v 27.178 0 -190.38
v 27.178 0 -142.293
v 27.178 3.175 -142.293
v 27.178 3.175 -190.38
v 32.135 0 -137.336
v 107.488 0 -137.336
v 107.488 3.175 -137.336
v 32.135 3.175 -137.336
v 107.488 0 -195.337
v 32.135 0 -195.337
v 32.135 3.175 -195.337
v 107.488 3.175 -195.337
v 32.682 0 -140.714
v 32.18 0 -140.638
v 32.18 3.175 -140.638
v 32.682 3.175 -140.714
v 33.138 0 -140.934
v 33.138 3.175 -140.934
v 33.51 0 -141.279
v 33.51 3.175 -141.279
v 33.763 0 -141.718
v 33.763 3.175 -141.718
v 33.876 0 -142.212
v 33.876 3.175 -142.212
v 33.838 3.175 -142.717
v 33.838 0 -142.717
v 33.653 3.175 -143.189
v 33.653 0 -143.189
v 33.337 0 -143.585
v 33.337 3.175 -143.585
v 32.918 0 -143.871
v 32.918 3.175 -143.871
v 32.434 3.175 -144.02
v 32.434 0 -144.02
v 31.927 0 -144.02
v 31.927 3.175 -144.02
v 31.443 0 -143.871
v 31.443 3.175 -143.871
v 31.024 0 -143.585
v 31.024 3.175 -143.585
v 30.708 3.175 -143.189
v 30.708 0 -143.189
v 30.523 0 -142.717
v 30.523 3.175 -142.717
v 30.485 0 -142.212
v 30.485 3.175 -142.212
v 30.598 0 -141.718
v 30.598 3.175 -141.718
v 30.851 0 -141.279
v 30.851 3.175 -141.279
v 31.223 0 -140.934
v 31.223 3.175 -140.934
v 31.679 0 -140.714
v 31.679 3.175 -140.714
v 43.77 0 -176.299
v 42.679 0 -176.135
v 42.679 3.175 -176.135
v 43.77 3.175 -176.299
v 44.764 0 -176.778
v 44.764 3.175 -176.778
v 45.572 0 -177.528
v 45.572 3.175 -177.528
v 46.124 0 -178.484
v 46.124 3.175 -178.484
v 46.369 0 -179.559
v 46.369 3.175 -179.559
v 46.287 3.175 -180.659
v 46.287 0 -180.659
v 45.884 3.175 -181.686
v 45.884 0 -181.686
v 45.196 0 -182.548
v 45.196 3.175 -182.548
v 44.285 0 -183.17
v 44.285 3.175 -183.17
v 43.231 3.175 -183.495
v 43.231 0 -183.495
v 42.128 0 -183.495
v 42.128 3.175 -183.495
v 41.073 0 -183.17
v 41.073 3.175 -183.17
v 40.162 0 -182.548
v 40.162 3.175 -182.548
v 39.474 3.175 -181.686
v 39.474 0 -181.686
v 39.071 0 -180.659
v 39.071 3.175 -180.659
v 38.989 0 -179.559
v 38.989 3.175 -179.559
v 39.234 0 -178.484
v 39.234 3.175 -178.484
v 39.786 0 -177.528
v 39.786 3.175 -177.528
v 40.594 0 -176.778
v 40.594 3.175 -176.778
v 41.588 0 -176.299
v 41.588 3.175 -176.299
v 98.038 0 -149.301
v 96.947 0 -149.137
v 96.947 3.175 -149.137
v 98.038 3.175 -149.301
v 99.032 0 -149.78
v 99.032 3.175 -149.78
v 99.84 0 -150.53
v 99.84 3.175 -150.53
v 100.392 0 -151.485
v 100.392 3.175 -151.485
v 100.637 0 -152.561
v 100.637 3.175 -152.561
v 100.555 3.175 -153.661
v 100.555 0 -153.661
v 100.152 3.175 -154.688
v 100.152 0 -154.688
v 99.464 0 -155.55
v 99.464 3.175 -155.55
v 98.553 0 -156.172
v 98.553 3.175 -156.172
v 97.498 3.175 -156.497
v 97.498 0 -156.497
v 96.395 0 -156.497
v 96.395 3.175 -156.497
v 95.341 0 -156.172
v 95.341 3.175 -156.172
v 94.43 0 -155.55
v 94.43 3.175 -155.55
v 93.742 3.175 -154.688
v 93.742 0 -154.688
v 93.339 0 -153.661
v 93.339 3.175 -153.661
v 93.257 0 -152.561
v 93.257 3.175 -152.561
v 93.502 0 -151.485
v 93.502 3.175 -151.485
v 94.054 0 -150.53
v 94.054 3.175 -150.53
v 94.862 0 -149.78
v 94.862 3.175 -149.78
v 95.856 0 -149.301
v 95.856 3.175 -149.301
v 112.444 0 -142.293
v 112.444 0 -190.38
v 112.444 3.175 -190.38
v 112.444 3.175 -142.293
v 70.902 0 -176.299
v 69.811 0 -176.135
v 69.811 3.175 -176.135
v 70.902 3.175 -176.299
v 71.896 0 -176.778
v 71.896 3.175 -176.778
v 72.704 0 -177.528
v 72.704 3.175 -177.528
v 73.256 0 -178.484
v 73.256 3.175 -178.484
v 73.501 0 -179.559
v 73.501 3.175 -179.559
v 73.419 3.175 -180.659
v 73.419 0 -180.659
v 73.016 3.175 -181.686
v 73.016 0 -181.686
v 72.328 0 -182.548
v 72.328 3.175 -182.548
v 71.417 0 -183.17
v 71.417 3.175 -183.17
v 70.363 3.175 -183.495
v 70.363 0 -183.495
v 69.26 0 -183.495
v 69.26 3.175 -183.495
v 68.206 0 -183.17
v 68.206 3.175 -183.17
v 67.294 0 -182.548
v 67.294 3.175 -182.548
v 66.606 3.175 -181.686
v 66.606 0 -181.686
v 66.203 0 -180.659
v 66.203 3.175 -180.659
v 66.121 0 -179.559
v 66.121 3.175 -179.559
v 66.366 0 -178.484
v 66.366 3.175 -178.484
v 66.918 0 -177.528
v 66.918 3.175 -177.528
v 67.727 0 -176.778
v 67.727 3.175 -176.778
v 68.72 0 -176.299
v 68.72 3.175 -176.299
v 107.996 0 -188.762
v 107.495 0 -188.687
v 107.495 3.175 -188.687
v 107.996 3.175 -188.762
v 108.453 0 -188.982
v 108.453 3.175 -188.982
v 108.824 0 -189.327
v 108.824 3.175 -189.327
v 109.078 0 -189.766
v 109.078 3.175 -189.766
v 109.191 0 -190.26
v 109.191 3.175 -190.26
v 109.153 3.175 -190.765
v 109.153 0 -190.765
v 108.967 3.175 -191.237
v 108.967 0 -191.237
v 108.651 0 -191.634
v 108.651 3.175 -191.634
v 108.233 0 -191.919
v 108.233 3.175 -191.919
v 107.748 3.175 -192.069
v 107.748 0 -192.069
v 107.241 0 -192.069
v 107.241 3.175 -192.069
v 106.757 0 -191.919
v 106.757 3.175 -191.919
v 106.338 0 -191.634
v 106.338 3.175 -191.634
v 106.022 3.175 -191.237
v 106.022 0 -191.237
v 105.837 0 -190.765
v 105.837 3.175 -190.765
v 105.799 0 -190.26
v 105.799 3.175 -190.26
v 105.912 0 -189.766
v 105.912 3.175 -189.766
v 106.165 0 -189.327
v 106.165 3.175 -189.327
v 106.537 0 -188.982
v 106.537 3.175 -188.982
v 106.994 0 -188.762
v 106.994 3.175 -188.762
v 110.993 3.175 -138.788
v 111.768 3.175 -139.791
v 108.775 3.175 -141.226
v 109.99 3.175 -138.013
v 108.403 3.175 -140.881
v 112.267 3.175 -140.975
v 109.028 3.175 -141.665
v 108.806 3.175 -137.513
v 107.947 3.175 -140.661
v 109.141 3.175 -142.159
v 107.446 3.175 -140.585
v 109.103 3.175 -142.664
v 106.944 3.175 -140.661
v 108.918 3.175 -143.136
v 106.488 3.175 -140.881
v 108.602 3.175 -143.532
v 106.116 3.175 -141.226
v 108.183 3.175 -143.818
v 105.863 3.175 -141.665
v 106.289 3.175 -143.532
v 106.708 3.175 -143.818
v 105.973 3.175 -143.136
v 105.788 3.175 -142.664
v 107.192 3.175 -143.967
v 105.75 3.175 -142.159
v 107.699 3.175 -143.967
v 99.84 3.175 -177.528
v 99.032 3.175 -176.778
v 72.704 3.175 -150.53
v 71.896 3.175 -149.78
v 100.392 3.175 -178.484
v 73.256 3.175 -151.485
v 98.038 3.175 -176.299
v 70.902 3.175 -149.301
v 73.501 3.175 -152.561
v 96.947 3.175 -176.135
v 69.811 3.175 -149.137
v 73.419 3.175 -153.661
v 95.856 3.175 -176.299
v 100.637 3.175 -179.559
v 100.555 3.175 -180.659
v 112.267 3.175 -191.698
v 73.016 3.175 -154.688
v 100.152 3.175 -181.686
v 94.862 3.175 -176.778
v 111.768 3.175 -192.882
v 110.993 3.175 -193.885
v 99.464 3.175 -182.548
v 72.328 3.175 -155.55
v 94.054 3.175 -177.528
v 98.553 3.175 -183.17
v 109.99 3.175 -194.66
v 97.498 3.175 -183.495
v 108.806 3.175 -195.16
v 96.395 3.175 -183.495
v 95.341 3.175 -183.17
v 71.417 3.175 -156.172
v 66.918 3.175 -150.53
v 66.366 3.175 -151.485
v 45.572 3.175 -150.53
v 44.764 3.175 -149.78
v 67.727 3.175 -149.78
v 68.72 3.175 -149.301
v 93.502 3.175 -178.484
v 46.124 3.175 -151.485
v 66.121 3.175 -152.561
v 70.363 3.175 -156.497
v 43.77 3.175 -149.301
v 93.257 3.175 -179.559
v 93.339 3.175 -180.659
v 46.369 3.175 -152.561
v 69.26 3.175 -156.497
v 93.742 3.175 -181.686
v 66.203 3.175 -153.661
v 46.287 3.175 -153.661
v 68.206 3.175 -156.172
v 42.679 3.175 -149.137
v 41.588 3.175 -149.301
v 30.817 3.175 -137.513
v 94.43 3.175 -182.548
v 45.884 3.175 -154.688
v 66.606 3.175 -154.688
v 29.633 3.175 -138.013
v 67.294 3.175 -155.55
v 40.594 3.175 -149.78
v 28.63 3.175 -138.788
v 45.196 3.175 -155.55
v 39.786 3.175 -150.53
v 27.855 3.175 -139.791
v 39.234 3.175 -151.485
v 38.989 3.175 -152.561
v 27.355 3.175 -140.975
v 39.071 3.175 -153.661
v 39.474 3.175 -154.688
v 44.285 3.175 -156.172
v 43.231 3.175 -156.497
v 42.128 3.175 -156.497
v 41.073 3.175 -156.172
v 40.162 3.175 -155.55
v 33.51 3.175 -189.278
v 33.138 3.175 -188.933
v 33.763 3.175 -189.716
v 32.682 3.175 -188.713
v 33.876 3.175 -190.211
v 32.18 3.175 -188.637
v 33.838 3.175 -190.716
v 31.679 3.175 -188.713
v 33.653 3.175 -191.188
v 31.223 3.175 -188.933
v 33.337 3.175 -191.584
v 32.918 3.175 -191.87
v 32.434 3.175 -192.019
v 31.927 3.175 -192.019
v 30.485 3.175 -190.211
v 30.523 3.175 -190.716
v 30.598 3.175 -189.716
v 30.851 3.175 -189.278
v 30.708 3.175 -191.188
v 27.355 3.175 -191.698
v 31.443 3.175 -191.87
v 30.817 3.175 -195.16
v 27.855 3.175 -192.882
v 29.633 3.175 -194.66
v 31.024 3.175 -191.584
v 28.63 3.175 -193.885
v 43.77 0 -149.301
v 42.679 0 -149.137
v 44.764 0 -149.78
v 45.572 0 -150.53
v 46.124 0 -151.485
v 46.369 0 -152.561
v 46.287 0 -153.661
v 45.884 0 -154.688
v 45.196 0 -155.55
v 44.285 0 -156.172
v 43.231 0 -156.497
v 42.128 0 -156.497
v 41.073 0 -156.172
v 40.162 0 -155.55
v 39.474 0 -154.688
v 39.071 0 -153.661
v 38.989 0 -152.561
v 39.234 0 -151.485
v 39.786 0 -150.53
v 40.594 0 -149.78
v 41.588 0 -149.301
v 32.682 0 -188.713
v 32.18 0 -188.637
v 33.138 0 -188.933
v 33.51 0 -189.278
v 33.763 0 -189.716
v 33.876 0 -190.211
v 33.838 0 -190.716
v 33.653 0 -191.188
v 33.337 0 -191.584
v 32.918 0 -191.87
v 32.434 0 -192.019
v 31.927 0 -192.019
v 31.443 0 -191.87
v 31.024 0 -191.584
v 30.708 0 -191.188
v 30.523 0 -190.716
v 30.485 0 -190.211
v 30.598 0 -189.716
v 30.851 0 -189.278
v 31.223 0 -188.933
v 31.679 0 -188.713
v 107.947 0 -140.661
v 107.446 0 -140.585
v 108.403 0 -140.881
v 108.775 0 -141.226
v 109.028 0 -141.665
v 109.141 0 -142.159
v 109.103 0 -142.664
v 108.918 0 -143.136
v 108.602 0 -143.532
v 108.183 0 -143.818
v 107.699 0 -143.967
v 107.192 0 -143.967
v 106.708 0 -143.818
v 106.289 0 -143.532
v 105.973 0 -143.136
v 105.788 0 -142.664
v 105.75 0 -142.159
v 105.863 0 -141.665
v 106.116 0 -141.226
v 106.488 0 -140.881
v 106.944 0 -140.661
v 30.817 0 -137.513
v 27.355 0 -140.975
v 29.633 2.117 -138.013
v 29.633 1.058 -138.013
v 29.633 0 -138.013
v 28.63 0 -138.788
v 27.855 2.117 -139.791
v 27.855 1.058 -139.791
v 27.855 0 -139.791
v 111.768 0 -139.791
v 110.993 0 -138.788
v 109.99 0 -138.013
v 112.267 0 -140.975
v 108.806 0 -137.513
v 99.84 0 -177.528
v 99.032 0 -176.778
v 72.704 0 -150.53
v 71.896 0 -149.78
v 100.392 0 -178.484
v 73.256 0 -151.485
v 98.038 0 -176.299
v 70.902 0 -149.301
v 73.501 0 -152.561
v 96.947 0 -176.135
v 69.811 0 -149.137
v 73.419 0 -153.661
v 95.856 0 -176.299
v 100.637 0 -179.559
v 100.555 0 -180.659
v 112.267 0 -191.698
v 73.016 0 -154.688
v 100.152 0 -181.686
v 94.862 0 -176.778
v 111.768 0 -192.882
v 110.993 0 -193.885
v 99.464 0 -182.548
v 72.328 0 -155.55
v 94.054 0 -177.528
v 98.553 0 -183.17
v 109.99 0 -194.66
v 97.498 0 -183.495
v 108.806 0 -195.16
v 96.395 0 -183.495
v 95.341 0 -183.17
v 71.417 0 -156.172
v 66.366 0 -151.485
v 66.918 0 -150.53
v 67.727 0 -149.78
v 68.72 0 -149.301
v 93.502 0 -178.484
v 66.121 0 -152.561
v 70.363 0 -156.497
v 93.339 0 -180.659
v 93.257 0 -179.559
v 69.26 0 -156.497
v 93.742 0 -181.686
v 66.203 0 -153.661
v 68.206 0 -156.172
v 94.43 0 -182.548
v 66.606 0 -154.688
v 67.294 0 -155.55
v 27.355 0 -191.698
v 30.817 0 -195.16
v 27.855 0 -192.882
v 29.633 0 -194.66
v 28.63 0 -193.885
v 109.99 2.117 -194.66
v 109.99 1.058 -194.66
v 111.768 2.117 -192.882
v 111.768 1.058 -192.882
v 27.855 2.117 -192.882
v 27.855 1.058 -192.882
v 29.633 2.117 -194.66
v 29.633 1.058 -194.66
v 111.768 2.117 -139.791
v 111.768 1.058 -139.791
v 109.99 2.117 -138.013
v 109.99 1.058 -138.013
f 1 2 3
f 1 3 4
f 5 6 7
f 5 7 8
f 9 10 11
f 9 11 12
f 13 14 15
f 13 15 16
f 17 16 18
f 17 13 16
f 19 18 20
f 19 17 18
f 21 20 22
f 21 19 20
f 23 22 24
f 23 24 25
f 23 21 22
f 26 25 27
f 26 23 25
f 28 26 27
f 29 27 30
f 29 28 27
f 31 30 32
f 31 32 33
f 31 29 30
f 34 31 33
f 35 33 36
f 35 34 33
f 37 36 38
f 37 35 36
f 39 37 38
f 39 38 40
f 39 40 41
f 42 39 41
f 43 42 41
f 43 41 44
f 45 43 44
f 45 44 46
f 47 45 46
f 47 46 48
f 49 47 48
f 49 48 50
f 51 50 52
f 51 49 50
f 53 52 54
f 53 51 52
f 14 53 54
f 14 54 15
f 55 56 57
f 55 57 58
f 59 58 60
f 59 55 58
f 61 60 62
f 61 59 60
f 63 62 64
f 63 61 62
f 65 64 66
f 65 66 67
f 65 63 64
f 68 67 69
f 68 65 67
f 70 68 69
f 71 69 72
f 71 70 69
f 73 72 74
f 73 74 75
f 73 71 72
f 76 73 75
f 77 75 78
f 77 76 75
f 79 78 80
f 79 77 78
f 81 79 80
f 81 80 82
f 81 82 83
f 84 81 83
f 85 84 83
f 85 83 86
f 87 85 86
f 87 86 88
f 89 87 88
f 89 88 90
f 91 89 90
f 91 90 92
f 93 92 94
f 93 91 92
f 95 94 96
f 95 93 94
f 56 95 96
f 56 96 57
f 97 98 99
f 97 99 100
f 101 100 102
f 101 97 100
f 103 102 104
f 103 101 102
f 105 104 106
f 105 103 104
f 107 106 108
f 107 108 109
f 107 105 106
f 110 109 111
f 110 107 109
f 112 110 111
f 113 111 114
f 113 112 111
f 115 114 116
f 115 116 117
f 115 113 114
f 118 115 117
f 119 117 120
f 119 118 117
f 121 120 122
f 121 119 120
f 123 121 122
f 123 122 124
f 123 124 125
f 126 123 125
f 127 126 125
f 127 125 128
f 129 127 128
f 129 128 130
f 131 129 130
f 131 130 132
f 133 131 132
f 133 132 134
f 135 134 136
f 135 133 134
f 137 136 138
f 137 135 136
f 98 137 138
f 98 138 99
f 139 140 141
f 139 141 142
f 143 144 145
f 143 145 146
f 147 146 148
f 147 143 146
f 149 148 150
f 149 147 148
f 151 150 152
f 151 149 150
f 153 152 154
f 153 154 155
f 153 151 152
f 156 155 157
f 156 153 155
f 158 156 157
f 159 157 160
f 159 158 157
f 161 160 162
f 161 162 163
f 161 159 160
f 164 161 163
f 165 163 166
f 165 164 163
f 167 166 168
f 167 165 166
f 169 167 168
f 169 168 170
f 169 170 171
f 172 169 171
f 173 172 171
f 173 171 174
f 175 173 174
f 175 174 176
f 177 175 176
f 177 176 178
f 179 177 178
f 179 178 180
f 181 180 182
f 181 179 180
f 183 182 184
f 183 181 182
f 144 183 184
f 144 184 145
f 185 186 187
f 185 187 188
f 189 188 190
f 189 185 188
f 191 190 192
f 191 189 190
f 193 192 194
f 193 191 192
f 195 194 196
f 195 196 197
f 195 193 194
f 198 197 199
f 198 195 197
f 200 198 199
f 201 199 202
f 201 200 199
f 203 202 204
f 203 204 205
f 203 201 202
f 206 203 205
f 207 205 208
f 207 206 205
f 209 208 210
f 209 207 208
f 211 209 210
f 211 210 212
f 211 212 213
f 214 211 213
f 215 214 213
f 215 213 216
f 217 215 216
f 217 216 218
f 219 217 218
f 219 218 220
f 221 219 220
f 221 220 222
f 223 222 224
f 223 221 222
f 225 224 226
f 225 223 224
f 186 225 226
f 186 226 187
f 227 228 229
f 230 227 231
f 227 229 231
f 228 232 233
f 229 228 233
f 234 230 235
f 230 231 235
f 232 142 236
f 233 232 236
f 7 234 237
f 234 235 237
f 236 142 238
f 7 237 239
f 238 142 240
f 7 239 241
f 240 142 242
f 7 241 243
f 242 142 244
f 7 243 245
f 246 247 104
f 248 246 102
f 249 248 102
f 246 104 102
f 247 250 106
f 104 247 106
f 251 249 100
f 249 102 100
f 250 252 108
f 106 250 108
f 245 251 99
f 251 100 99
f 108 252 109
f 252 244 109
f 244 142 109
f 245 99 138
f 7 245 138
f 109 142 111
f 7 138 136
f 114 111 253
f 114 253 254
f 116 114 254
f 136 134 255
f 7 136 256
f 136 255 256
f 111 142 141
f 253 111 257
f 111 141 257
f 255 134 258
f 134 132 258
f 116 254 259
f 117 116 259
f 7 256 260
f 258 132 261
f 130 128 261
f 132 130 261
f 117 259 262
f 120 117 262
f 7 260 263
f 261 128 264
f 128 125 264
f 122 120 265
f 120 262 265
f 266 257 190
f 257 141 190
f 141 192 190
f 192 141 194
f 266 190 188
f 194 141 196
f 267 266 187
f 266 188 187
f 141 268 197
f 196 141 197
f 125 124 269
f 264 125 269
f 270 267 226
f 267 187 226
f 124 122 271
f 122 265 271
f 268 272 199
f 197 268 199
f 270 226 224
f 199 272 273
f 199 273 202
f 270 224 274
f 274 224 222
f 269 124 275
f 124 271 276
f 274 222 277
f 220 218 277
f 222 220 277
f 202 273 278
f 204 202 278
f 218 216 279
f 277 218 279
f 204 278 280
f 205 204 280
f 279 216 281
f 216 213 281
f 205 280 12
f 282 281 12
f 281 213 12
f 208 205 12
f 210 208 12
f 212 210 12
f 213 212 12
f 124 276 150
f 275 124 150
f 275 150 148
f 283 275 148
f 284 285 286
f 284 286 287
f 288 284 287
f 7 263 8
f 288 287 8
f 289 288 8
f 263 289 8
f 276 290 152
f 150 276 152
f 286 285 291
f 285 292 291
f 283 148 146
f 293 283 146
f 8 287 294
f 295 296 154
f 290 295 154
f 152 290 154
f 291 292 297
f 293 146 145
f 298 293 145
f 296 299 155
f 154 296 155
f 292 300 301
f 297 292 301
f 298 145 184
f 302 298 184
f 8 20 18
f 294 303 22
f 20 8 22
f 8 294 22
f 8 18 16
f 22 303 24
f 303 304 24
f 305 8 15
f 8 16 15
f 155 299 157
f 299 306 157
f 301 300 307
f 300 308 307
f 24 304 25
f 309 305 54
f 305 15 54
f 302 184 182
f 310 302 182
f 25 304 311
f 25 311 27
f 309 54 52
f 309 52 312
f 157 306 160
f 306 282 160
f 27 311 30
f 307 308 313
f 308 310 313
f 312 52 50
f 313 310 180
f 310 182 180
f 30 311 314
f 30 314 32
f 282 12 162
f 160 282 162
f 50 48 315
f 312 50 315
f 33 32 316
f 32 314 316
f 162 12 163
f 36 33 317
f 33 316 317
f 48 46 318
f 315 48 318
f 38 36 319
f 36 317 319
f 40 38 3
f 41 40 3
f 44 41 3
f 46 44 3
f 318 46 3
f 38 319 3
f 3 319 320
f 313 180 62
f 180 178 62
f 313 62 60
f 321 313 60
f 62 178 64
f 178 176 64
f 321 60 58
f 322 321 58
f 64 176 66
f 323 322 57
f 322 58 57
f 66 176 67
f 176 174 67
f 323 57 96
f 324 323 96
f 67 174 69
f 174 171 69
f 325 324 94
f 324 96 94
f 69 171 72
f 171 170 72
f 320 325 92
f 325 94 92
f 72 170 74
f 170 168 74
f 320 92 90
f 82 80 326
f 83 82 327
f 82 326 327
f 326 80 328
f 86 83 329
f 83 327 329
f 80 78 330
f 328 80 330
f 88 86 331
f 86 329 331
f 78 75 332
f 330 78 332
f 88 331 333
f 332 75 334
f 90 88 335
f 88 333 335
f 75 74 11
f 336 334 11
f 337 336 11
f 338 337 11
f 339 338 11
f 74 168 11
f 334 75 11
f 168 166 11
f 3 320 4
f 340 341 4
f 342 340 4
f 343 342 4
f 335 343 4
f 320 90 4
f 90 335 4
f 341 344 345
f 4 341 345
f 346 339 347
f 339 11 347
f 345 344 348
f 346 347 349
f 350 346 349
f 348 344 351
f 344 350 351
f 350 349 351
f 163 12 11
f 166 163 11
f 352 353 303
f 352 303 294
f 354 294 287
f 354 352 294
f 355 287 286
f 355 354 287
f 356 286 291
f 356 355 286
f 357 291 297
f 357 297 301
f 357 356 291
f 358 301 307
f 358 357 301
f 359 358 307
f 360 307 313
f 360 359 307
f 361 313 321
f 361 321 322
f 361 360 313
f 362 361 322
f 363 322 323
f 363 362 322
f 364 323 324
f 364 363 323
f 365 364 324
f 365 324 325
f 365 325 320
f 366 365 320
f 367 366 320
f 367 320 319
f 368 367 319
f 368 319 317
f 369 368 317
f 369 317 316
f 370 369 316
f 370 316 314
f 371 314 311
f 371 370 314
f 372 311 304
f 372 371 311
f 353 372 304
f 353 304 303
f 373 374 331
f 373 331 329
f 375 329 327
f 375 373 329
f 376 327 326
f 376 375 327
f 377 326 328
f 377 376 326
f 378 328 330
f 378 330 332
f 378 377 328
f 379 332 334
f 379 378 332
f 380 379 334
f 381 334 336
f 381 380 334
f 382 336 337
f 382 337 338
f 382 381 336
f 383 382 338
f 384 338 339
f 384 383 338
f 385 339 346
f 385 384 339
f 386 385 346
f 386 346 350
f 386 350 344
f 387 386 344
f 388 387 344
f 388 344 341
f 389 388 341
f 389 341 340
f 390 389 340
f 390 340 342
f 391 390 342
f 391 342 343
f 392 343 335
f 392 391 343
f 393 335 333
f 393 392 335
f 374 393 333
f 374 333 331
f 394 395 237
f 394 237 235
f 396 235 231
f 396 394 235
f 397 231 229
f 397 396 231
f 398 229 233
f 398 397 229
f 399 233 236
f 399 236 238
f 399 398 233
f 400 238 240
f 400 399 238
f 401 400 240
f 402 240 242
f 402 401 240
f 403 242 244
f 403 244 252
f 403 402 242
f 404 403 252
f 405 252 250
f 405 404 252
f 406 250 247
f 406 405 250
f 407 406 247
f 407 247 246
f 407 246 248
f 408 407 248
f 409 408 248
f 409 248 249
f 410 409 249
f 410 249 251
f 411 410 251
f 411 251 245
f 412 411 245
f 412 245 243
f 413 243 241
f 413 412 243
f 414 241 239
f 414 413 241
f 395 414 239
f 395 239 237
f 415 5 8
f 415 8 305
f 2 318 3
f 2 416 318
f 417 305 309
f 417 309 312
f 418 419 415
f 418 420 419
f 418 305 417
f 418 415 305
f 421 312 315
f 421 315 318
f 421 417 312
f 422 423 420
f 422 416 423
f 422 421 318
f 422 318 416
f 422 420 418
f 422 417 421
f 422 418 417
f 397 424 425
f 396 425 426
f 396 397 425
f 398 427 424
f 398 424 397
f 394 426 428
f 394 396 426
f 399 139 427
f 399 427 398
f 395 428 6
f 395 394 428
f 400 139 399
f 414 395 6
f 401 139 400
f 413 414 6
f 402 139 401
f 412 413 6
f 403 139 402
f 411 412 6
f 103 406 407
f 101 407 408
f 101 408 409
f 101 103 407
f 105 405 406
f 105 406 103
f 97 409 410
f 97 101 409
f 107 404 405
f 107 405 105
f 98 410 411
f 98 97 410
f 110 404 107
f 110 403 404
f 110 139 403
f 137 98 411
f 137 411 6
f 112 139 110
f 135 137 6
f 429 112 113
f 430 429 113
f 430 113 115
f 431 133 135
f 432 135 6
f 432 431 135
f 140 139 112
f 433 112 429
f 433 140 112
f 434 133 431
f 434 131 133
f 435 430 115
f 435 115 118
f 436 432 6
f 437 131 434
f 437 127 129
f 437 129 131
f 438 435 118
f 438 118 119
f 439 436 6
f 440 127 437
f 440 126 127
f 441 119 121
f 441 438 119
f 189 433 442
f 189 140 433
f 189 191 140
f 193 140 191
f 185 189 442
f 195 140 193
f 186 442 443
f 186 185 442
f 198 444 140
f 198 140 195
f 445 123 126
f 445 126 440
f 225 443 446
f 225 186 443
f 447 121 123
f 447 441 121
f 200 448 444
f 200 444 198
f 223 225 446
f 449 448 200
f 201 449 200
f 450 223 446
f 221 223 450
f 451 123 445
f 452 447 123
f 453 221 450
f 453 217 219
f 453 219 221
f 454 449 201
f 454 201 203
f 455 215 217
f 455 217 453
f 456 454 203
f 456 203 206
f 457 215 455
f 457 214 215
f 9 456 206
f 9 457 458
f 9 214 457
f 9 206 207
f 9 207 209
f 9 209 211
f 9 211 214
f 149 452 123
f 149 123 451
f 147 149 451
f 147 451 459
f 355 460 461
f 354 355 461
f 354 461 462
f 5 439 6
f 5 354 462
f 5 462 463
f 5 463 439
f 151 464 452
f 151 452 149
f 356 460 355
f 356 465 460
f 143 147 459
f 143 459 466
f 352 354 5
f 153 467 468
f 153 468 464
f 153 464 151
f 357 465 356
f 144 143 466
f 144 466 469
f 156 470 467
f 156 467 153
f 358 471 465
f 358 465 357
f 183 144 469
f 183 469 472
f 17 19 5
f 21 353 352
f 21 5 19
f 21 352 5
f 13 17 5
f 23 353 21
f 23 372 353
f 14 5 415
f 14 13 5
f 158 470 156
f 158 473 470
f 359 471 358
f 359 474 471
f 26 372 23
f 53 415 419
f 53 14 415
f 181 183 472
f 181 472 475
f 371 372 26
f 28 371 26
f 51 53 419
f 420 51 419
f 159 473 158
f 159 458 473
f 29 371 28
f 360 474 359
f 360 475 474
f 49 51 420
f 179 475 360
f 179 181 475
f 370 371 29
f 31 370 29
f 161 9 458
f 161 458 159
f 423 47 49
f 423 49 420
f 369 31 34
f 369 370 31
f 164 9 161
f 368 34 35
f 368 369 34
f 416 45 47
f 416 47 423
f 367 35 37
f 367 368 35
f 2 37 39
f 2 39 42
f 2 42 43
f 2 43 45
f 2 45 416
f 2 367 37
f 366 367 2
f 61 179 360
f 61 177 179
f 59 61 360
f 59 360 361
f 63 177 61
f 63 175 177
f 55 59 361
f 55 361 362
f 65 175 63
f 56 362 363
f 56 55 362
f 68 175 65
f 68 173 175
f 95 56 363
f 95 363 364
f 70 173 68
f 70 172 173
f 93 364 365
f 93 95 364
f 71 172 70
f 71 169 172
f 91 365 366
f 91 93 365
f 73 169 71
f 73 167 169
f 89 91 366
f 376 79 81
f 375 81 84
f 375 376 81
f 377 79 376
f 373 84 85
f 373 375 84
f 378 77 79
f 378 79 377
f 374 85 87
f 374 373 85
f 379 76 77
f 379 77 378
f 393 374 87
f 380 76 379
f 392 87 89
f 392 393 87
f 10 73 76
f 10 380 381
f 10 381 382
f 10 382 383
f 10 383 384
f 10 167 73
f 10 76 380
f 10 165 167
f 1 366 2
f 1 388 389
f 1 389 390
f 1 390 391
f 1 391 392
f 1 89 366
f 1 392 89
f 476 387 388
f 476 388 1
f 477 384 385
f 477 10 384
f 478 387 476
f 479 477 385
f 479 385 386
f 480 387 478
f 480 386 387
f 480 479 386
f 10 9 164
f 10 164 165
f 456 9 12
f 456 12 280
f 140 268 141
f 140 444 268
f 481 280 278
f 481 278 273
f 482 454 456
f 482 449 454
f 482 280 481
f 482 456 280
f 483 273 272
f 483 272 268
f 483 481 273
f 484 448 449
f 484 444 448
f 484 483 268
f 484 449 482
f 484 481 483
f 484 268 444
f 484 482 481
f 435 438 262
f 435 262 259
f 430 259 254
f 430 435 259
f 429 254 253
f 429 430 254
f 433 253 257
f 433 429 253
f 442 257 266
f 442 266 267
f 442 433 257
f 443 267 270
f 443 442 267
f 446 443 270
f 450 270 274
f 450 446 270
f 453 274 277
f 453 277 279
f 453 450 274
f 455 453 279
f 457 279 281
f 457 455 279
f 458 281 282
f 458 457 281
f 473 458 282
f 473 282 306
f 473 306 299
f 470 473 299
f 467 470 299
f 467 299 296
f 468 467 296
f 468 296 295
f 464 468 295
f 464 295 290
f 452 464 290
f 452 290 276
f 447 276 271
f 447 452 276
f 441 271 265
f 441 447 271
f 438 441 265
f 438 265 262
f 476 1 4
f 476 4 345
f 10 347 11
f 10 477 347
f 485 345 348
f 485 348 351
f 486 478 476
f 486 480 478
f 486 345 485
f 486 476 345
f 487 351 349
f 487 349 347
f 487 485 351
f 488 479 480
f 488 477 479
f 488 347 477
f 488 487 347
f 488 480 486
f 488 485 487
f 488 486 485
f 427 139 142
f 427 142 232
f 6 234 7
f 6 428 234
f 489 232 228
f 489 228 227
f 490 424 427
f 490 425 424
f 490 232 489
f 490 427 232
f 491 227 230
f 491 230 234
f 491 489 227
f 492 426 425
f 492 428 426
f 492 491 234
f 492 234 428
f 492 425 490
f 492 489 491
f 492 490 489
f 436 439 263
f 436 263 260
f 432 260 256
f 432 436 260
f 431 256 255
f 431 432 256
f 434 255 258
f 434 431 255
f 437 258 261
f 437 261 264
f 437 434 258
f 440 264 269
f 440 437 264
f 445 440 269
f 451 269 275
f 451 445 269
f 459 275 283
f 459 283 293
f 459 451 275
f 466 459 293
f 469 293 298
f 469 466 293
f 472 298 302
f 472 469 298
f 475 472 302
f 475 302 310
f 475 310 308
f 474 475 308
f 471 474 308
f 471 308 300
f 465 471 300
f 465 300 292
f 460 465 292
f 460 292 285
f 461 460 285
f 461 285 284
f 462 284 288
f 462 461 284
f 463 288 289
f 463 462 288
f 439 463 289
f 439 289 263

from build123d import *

# Parameters (mm, degrees)
SKETCH1_R           = 3.700636789
SKETCH1_R_2         = 3.700638134
SKETCH1_R_3         = 3.700635443
SKETCH1_R_4         = 1.700388108
SKETCH1_R_5         = 1.700390127
SKETCH1_R_6         = 1.700391472
BOSS_EXTRUDE1_DEPTH = 3.175


with BuildPart() as part:
    # Sketch1 → Boss-Extrude1 (new body)
    with BuildSketch(Plane(origin=(0, 0, 0), x_dir=(1, 0, 0), z_dir=(0, 1, 0))):
        with BuildLine():
            Line((107.487861946, 137.336384548), (32.134526478, 137.336384548))
            add(Edge.make_bspline(
                [(32.134526478, 137.336384548), (29.396970169, 137.336384548), (27.177997625, 139.555359784), (27.177997625, 142.292908018)],
                knots=[1, 1, 1, 1, 2, 2, 2, 2], degree=3))
            Line((27.177997625, 142.292908018), (27.177997625, 190.3800568))
            add(Edge.make_bspline(
                [(27.177997625, 190.3800568), (27.177997625, 193.117610417), (29.396970169, 195.336585653), (32.134526478, 195.336585653)],
                knots=[3, 3, 3, 3, 4, 4, 4, 4], degree=3))
            Line((32.134526478, 195.336585653), (107.487861946, 195.336585653))
            add(Edge.make_bspline(
                [(107.487861946, 195.336585653), (110.225420945, 195.336585653), (112.444385416, 193.1176158), (112.444385416, 190.3800568)],
                knots=[5, 5, 5, 5, 6, 6, 6, 6], degree=3))
            Line((112.444385416, 190.3800568), (112.444385416, 142.292918784))
            add(Edge.make_bspline(
                [(112.444385416, 142.292918784), (112.444385416, 139.555359784), (110.225420945, 137.336384548), (107.487861946, 137.336384548)],
                knots=[7, 7, 7, 7, 8, 8, 8, 8], degree=3))
        make_face()
        with Locations(Location((42.679056729, 179.835523857, 0), (0, 0, 270))):
            Circle(SKETCH1_R, mode=Mode.SUBTRACT)
        with Locations(Location((69.811194212, 179.835523857, 0), (0, 0, 270))):
            Circle(SKETCH1_R_2, mode=Mode.SUBTRACT)
        with Locations(Location((96.946860226, 179.835523857, 0), (0, 0, 270))):
            Circle(SKETCH1_R_3, mode=Mode.SUBTRACT)
        with Locations(Location((42.679056729, 152.837440961, 0), (0, 0, 270))):
            Circle(SKETCH1_R, mode=Mode.SUBTRACT)
        with Locations(Location((69.811194212, 152.837440961, 0), (0, 0, 270))):
            Circle(SKETCH1_R_2, mode=Mode.SUBTRACT)
        with Locations(Location((96.946860226, 152.837440961, 0), (0, 0, 270))):
            Circle(SKETCH1_R_3, mode=Mode.SUBTRACT)
        with Locations(Location((32.180389311, 190.337721152, 0), (0, 0, 270))):
            Circle(SKETCH1_R_4, mode=Mode.SUBTRACT)
        with Locations(Location((32.180389311, 142.338781618, 0), (0, 0, 270))):
            Circle(SKETCH1_R_5, mode=Mode.SUBTRACT)
        with Locations(Location((107.445530335, 142.285856339, 0), (0, 0, 270))):
            Circle(SKETCH1_R_6, mode=Mode.SUBTRACT)
        with Locations(Location((107.494913625, 190.38710848, 0), (0, 0, 270))):
            Circle(SKETCH1_R_6, mode=Mode.SUBTRACT)
    extrude(amount=BOSS_EXTRUDE1_DEPTH)


solid = part.part
